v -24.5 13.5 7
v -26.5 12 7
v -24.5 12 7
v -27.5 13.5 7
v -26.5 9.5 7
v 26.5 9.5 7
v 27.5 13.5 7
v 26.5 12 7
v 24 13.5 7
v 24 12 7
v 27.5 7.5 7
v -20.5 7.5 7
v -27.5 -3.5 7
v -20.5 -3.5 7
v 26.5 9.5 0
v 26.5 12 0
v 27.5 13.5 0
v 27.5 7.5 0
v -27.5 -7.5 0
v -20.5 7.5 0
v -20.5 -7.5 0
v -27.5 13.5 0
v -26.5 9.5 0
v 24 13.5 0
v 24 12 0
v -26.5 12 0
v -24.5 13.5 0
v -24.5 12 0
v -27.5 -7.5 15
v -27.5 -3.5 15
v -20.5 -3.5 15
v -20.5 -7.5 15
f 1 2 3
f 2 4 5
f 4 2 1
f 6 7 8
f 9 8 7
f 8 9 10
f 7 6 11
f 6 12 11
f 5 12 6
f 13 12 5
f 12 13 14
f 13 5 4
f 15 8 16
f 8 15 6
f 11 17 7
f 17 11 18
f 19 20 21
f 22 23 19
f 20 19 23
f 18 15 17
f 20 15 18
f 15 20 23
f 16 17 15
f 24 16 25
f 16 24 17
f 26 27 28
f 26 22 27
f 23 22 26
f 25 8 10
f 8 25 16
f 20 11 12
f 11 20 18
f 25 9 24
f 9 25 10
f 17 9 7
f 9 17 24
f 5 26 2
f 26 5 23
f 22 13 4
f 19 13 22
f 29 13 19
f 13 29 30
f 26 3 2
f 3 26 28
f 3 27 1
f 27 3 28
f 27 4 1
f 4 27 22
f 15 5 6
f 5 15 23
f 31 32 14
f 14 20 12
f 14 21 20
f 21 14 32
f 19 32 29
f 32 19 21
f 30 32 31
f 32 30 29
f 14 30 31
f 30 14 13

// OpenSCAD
nub_length = 15;
wall_thickness = 2;
top_thickness = 1;
metal_thickness = 1;
gap = 1.5;
metal_gap = metal_thickness + gap;
width = 7;
lip_thickness = 1.5;
top_lip_length = wall_thickness + 1;
bot_lip_length = wall_thickness + 1.5;
wall_height = 55;
trap_width = 15;


module lip_wrap(lip_length) {
  union() {
    cube([width, metal_gap + wall_thickness, top_thickness]);

    translate([0, metal_gap + wall_thickness, 0])
      cube([width, lip_thickness, lip_length]);
  }
}

translate([wall_height / 2, 7.5, 0])
rotate([0, -90, 0]) {
  union() {
    cube([width, wall_thickness, wall_height]);

    translate([0, 0 - nub_length, wall_height - width])
      cube([width, nub_length, width]);

    lip_wrap(bot_lip_length);

    translate([width, 0, wall_height])
      rotate([180, 0, 180])
        lip_wrap(top_lip_length);

    translate([0, - nub_length, wall_height - width])
      cube([trap_width, 4, width]);
  }
}
